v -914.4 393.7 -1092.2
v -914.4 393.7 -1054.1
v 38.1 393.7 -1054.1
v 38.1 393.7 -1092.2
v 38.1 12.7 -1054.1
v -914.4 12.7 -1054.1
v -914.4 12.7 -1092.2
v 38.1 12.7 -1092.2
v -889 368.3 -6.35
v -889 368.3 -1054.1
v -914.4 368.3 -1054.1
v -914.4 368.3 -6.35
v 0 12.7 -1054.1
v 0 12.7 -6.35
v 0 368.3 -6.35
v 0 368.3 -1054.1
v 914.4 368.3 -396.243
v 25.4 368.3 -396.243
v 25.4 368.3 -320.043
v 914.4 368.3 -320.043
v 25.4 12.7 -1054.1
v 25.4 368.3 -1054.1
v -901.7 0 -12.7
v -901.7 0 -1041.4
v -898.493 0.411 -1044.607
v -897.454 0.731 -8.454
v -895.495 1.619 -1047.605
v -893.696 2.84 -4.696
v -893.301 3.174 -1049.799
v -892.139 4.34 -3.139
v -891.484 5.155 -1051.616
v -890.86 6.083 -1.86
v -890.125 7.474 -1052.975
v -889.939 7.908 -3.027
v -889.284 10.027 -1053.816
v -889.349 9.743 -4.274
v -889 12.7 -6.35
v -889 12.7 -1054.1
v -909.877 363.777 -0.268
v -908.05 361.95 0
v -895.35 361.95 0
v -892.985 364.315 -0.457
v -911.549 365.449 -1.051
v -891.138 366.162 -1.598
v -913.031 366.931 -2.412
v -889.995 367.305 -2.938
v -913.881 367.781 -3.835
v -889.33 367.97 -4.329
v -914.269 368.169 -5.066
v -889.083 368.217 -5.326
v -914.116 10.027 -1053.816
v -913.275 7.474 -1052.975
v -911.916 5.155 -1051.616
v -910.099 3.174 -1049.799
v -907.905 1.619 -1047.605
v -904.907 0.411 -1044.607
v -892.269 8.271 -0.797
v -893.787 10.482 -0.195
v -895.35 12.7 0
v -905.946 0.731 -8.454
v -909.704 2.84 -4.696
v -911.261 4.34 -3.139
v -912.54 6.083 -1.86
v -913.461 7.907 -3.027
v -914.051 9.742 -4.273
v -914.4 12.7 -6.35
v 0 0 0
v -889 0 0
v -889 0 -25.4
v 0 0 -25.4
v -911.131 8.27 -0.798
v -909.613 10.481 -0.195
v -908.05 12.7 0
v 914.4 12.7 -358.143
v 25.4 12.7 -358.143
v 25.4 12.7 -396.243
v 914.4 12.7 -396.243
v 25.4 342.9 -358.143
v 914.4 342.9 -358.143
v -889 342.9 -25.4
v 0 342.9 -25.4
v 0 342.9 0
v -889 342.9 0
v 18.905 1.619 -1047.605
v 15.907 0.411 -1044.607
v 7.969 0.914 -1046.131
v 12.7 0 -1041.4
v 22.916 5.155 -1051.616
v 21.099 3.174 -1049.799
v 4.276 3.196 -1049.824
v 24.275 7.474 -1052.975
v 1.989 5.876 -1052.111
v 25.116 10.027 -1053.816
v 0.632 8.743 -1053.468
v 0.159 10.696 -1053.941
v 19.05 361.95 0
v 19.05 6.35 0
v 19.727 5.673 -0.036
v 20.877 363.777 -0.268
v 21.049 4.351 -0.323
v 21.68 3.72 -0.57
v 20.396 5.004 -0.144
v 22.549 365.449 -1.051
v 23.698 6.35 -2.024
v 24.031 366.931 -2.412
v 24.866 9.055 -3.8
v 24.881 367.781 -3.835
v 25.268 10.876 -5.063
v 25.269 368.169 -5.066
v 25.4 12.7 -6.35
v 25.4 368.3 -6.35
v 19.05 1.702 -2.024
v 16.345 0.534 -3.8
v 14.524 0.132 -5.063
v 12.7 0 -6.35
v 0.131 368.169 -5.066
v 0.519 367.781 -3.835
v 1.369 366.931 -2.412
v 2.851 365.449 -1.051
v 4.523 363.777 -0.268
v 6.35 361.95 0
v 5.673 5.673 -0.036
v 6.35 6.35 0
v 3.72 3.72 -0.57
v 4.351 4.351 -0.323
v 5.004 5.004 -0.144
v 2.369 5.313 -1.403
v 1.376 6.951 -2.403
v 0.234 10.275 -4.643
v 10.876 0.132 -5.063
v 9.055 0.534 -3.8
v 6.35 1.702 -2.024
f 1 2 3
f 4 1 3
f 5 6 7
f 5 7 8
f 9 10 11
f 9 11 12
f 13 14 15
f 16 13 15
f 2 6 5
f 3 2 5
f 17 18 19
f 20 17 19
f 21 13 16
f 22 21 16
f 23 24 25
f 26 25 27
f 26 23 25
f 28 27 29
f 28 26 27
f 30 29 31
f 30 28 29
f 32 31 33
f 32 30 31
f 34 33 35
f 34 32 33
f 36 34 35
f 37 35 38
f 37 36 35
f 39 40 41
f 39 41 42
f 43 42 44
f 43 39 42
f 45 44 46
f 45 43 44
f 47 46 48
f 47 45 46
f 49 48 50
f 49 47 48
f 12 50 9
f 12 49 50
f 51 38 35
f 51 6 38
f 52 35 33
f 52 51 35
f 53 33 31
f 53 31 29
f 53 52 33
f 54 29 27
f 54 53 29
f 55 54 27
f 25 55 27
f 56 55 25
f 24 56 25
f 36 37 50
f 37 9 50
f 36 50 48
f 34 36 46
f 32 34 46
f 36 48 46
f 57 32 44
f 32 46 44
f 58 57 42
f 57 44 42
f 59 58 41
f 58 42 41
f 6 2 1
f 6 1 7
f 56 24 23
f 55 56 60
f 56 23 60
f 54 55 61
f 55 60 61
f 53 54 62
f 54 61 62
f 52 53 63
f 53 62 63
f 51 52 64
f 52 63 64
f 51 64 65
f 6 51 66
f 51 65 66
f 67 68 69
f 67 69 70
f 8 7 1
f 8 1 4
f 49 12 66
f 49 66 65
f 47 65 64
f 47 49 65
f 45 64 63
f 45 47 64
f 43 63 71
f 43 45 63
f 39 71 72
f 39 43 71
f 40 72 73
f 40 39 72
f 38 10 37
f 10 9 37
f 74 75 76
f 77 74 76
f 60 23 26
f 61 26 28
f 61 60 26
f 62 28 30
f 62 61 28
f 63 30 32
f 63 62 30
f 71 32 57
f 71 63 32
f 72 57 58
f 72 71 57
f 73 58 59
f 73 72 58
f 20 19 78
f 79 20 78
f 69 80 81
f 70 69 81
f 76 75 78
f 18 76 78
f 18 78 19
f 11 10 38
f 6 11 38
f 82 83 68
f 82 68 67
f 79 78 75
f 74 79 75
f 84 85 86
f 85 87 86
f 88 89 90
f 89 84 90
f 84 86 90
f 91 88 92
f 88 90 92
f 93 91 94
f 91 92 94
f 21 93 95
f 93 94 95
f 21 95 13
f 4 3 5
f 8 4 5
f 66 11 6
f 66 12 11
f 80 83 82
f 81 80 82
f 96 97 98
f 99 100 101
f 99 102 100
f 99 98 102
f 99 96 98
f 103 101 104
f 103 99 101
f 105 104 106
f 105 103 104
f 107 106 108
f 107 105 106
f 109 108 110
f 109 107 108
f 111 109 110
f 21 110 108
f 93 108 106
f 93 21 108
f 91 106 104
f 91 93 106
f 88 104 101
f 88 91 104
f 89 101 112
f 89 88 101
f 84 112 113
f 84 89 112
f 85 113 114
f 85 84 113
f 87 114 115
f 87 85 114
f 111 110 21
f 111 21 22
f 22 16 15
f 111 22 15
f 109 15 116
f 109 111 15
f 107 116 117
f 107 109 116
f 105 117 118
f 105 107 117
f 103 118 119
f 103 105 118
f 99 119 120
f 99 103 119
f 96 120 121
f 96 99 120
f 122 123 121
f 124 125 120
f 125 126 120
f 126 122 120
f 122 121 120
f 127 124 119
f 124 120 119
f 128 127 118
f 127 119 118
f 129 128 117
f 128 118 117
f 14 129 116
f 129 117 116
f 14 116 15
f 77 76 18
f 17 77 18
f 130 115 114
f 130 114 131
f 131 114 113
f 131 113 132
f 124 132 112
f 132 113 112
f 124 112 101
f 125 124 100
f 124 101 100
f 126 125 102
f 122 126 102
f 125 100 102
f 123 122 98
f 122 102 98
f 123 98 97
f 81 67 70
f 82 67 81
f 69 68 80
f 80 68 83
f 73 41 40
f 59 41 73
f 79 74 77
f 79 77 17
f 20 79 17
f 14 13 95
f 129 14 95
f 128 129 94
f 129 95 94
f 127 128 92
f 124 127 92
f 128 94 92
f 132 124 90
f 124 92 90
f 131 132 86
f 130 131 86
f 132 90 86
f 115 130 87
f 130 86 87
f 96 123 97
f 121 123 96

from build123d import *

# Parameters (mm, degrees)
F0_W        = 368.3
F0_H        = 1054.1
F1_DEPTH    = 25.4
F2_R        = 6.35
F3_T1_DEPTH = 1111.25
F3_T3_DEPTH = 88.9
F4_W        = 889
F4_H        = 342.9
F5_DEPTH    = 25.4
F6_W        = 368.3
F6_H        = 1054.1
F7_DEPTH    = 25.4
F8_R        = 12.69999
F9_T1_DEPTH = 387.35001
F9_T3_DEPTH = 57.15
F11_DEPTH   = 889
F12_W       = 952.5
F12_H       = 381
F13_DEPTH   = 38.1


# Not quite as in the source:
# - a fillet or chamfer that OpenCascade refuses, or shapes differently, is made with other operations: its cross-section is extruded or revolved along the edge and cut away or added
# - a fillet or chamfer is up to 0.001 mm smaller than in the source, because OpenCascade refuses the exact size


with BuildPart() as f1:
    # F0 (on Right) → F1 (new body)
    with BuildSketch(Plane.YZ):
        with Locations((184.15, -527.05)):
            Rectangle(F0_W, F0_H)
    extrude(amount=F1_DEPTH)

    # F2
    f2_edges = [f1.edges().sort_by_distance(p)[0] for p in [
        (12.7, 368.3, 0),
        (12.7, 0, 0),
        (0, 184.15, 0),
        (25.4, 184.15, 0),
    ]]
    fillet(f2_edges, radius=F2_R)

    # F3: fillet of radius 12.7 on 4 edges, made by hand

    # F3_s2 → F3_t1 (cut)
    with BuildSketch(Plane.XY.offset(-1085.85)):
        with BuildLine():
            ThreePointArc((0, 12.7), (3.7197438789, 3.7197438789), (12.7, 0))
            Line((12.7, 0), (0, 0))
            Line((0, 0), (0, 12.7))
        make_face()
        with BuildLine():
            ThreePointArc((25.4, 12.7), (21.6802561211, 3.7197438789), (12.7, 0))
            Line((12.7, 0), (25.4, 0))
            Line((25.4, 0), (25.4, 12.7))
        make_face()
    extrude(amount=F3_T1_DEPTH, mode=Mode.SUBTRACT)

    # F3_s4 → F3_t3 (cut)
    with BuildSketch(Plane.YZ.offset(-31.75)):
        with BuildLine():
            ThreePointArc((0, -1041.4), (3.7197438789, -1050.3802561211), (12.7, -1054.1))
            Line((12.7, -1054.1), (0, -1054.1))
            Line((0, -1054.1), (0, -1041.4))
        make_face()
    extrude(amount=F3_T3_DEPTH, mode=Mode.SUBTRACT)


with BuildPart() as f5:
    # F4 (on Top) → F5 (new body)
    with BuildSketch(Plane.XY):
        with Locations((-444.5, 171.45)):
            Rectangle(F4_W, F4_H)
    extrude(amount=-F5_DEPTH)


with BuildPart() as f7:
    # F6 (on face) → F7 (new body)
    with BuildSketch(Plane(origin=(-889, 0, 0), x_dir=(0, -1, 0), z_dir=(-1, 0, 0))):
        with Locations((-184.15, -527.05)):
            Rectangle(F6_W, F6_H)
    extrude(amount=F7_DEPTH)

    # F8 (radius 12.7 in the source; OpenCascade refuses exactly that, so slightly less here)
    f8_edges = [f7.edges().sort_by_distance(p)[0] for p in [
        (-901.7, 0, -1054.1),
        (-901.7, 0, 0),
        (-889, 0, -527.05),
        (-914.4, 0, -527.05),
    ]]
    fillet(f8_edges, radius=F8_R)

    # F9: fillet of radius 6.35 on 4 edges, made by hand

    # F9_s2 → F9_t1 (cut)
    with BuildSketch(Plane.XZ.offset(-384.175)):
        with BuildLine():
            ThreePointArc((-889, -6.35), (-890.8598719395, -1.8598719395), (-895.35, 0))
            Line((-895.35, 0), (-889, 0))
            Line((-889, 0), (-889, -6.35))
        make_face()
        with BuildLine():
            ThreePointArc((-914.4, -6.35), (-912.5401280605, -1.8598719395), (-908.05, 0))
            Line((-908.05, 0), (-914.4, 0))
            Line((-914.4, 0), (-914.4, -6.35))
        make_face()
    extrude(amount=F9_T1_DEPTH, mode=Mode.SUBTRACT)

    # F9_s4 → F9_t3 (cut)
    with BuildSketch(Plane.YZ.offset(-930.275)):
        with BuildLine():
            ThreePointArc((361.95, 0), (366.4401280605, -1.8598719395), (368.3, -6.35))
            Line((368.3, -6.35), (368.3, 0))
            Line((368.3, 0), (361.95, 0))
        make_face()
    extrude(amount=F9_T3_DEPTH, mode=Mode.SUBTRACT)


with BuildPart() as f11:
    # F10 (on face) → F11 (new body)
    with BuildSketch(Plane.YZ.offset(25.4)):
        Polygon((368.3, -396.2427675724), (368.3, -320.0427675724), (342.9, -358.1427675724), (12.7, -358.1427675724), (12.7, -396.2427675724), align=None)
    extrude(amount=F11_DEPTH)


with BuildPart() as f13:
    # F12 (on face) → F13 (new body)
    with BuildSketch(Plane(origin=(0, 0, -1054.1), x_dir=(1, 0, 0), z_dir=(0, 0, -1))):
        with Locations((-438.15, -203.2)):
            Rectangle(F12_W, F12_H)
    extrude(amount=F13_DEPTH)


solid = Compound([f1.part, f5.part, f7.part, f11.part, f13.part])
